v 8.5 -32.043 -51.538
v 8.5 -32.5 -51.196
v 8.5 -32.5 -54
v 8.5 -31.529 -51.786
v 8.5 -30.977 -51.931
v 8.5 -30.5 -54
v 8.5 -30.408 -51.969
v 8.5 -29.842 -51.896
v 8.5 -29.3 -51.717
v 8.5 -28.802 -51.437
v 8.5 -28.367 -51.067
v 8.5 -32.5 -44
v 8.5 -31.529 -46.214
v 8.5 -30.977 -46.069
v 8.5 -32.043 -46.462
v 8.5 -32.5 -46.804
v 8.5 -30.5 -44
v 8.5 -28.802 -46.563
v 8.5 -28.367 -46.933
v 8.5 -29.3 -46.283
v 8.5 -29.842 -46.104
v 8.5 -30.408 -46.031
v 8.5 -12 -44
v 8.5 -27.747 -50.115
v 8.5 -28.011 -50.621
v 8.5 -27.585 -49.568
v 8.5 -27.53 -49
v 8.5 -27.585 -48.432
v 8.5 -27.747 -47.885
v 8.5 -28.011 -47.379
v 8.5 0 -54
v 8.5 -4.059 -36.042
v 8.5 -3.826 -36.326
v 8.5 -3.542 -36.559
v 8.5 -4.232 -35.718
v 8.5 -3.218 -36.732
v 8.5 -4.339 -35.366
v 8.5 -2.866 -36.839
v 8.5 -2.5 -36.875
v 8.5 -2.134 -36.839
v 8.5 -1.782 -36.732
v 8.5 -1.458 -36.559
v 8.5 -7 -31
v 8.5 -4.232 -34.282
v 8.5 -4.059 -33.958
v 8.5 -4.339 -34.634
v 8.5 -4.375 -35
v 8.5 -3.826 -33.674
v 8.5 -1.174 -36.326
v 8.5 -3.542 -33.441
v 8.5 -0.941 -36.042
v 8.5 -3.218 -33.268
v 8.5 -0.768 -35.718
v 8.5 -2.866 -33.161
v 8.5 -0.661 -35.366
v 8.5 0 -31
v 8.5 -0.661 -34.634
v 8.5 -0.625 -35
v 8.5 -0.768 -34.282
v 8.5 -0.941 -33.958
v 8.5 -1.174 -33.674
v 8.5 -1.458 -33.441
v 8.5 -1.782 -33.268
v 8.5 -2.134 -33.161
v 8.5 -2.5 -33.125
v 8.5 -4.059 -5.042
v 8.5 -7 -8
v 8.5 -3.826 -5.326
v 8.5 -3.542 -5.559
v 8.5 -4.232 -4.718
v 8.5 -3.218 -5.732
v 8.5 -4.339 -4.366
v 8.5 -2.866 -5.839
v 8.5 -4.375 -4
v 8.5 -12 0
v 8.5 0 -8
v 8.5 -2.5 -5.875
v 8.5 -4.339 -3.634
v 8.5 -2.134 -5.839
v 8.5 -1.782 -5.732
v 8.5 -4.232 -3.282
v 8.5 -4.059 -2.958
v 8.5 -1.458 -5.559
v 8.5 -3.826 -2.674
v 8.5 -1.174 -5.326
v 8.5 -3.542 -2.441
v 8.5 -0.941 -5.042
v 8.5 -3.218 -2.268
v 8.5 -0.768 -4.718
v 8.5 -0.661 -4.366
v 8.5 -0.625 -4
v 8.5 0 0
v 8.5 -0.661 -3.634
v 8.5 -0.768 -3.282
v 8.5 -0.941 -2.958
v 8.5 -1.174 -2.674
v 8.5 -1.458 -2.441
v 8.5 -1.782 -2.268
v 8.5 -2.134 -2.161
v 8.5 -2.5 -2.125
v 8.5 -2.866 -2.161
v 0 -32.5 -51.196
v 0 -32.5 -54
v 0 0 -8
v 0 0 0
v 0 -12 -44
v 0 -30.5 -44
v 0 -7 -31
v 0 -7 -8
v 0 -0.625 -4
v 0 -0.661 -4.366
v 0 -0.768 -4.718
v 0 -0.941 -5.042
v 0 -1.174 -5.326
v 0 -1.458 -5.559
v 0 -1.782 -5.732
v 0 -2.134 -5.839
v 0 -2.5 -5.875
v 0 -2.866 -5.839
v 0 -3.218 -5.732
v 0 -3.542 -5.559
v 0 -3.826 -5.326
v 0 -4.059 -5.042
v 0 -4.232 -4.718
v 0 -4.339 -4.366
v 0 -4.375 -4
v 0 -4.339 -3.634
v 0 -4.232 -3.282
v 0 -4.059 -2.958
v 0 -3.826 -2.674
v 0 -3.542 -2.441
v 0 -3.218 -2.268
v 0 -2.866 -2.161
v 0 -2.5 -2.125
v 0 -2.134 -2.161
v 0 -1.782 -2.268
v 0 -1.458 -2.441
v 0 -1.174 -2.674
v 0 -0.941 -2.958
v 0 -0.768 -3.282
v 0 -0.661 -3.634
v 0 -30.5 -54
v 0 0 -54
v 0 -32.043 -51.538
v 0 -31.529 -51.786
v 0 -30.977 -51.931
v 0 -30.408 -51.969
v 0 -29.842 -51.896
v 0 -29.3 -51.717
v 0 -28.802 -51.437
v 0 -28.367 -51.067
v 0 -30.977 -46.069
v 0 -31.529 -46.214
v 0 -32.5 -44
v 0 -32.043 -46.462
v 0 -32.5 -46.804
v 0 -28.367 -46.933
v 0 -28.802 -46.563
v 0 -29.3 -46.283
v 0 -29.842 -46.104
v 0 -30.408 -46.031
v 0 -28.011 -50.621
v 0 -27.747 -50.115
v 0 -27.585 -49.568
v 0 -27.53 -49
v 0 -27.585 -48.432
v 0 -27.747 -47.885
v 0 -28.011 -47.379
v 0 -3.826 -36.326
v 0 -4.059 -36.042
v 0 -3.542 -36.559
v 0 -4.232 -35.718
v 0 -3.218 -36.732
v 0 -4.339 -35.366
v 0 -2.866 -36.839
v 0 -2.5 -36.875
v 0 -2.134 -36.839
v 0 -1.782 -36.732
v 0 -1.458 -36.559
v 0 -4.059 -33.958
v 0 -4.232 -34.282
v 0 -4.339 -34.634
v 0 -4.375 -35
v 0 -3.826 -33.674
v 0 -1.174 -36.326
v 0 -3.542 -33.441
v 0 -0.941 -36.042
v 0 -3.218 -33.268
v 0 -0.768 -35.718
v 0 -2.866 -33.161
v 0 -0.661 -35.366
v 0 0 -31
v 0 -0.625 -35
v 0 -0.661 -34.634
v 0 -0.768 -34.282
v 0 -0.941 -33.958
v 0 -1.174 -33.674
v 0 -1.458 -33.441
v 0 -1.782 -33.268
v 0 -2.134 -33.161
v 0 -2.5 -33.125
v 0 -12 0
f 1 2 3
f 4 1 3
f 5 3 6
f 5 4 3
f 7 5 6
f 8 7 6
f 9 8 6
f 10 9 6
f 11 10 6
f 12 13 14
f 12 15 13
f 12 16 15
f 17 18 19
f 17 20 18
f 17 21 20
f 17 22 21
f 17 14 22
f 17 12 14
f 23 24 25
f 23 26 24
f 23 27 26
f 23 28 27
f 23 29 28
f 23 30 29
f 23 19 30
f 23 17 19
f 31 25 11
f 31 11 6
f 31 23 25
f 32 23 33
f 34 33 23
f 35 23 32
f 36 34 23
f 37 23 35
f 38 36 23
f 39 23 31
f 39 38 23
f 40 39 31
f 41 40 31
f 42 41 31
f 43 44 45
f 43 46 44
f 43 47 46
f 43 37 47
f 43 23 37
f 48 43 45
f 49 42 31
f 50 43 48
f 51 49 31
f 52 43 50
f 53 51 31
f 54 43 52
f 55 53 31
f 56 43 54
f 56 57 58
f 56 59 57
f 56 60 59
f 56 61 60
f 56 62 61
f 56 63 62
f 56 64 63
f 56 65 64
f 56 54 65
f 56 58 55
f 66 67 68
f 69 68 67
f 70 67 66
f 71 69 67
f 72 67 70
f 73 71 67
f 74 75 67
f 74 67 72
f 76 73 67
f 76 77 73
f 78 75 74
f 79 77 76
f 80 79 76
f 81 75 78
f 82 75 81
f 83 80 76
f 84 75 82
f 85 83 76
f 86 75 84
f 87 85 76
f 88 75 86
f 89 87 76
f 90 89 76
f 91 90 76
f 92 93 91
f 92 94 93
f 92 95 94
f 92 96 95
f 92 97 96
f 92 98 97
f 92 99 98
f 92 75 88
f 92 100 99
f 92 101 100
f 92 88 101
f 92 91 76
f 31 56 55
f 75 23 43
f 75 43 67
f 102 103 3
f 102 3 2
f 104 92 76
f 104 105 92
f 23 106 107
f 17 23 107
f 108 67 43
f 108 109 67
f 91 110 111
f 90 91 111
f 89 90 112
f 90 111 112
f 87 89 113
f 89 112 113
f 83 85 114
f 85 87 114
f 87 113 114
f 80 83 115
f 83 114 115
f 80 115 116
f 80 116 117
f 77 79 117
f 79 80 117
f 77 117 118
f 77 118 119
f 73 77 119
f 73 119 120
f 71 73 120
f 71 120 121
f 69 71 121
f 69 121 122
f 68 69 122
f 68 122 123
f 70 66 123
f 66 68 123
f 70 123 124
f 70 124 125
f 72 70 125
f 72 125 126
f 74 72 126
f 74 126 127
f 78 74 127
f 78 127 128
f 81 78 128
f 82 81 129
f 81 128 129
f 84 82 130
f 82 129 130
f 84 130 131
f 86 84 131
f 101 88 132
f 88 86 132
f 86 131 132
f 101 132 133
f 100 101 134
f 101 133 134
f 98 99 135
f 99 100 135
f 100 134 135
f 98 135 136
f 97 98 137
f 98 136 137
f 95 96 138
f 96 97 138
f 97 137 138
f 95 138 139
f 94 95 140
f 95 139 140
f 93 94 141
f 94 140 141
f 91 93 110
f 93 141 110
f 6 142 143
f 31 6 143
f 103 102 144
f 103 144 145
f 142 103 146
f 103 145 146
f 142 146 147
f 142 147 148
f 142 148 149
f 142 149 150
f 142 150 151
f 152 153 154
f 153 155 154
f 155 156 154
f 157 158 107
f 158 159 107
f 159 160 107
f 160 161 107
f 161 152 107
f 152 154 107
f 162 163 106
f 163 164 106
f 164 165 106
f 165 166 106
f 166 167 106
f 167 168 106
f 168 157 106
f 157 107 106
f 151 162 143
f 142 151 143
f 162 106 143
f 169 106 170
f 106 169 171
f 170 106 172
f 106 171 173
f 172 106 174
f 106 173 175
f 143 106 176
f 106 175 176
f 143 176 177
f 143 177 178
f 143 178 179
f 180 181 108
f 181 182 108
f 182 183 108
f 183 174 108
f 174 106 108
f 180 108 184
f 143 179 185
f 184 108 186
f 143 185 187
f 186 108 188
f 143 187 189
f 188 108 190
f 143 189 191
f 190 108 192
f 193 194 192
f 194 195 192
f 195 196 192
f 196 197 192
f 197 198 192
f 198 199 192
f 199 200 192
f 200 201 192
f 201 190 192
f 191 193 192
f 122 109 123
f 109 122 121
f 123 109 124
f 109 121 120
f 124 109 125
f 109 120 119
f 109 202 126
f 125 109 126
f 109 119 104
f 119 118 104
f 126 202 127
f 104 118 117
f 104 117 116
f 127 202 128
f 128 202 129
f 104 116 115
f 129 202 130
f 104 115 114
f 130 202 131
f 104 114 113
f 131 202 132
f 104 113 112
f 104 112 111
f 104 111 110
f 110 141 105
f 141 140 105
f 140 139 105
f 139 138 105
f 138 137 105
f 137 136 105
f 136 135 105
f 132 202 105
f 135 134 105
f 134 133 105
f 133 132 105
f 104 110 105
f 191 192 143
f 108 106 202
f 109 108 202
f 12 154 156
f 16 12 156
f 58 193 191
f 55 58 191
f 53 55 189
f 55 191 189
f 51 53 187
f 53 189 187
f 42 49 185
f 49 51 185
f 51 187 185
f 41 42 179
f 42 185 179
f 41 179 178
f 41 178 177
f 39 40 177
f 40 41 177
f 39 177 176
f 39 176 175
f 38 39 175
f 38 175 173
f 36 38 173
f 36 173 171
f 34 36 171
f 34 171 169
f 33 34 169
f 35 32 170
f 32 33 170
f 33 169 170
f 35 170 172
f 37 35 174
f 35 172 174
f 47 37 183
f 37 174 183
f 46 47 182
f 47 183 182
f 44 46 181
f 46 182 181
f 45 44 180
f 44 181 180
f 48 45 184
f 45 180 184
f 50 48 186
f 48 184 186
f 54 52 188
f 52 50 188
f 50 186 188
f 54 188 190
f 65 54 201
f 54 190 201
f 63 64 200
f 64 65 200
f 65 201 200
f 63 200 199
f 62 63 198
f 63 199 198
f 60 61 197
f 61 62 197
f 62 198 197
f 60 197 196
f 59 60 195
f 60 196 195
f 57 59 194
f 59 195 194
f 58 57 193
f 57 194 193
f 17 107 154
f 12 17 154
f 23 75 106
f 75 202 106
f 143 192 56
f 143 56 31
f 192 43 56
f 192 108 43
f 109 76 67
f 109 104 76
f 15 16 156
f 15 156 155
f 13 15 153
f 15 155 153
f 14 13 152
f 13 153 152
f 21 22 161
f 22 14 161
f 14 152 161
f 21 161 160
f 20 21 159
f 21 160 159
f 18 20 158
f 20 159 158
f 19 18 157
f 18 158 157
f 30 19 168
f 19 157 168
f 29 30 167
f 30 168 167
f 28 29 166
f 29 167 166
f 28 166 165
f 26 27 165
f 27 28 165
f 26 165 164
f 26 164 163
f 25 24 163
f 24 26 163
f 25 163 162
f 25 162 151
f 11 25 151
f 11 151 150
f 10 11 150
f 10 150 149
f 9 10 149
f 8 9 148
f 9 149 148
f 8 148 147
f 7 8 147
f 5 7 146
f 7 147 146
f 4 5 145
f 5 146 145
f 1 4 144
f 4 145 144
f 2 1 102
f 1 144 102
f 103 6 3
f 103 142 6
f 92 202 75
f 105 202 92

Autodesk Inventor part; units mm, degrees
ref_plane "YZ Plane" through (0, 0, 0) normal (1, 0, 0) x (0, 1, 0)
ref_plane "XZ Plane" through (0, 0, 0) normal (0, 1, 0) x (-1, 0, 0)
ref_plane "XY Plane" through (0, 0, 0) normal (0, 0, 1) x (1, 0, 0)
sketch "Sketch1" plane through (0, 0, 0) normal (1, 0, 0) x (0, 1, 0)
  line L0 (0, 0) -> (0, -8)
  line L1 (0, -8) -> (-7, -8)
  line L2 (-7, -8) -> (-7, -31)
  line L3 (-7, -31) -> (0, -31)
  line L4 (-12, 0) -> (0, 0)
  line L5 (0, -4) -> (-2.5, -4) construction
  circle A0 centre (-2.5, -4) radius 1.875
  line L6 (0, -31) -> (-2.5, -31) construction
  line L7 (-2.5, -31) -> (-2.5, -35) construction
  circle A1 centre (-2.5, -35) radius 1.875
  line L8 (-30.5, -54) -> (0, -54)
  arc A2 (-32.5, -51.1957) -> (-32.5, -46.8043) centre (-30.5, -49) ccw
  line L9 (-30.5, -44) -> (-32.5, -44)
  line L10 (-32.5, -44) -> (-32.5, -46.8043)
  line L11 (-30.5, -54) -> (-32.5, -54)
  line L12 (-32.5, -54) -> (-32.5, -51.1957)
  line L13 (-12, -44) -> (-30.5, -44)
  line L14 (0, -31) -> (0, -54)
  line L15 (-12, 0) -> (-12, -44)
  dimension "d0" = 8
  dimension "d1" = 7
  dimension "d2" = 23
  dimension "d5" = 2.5
  dimension "d6" = 3.75
  dimension "d7" = 4
  dimension "d8" = 3.75
  dimension "d10" = 30.5
  dimension "d11" = 10
  dimension "d13" = 2
extrude "Extrusion1" add sketch "Sketch1" along normal blind 8.5
properties part number "Laser_Holder_1"
